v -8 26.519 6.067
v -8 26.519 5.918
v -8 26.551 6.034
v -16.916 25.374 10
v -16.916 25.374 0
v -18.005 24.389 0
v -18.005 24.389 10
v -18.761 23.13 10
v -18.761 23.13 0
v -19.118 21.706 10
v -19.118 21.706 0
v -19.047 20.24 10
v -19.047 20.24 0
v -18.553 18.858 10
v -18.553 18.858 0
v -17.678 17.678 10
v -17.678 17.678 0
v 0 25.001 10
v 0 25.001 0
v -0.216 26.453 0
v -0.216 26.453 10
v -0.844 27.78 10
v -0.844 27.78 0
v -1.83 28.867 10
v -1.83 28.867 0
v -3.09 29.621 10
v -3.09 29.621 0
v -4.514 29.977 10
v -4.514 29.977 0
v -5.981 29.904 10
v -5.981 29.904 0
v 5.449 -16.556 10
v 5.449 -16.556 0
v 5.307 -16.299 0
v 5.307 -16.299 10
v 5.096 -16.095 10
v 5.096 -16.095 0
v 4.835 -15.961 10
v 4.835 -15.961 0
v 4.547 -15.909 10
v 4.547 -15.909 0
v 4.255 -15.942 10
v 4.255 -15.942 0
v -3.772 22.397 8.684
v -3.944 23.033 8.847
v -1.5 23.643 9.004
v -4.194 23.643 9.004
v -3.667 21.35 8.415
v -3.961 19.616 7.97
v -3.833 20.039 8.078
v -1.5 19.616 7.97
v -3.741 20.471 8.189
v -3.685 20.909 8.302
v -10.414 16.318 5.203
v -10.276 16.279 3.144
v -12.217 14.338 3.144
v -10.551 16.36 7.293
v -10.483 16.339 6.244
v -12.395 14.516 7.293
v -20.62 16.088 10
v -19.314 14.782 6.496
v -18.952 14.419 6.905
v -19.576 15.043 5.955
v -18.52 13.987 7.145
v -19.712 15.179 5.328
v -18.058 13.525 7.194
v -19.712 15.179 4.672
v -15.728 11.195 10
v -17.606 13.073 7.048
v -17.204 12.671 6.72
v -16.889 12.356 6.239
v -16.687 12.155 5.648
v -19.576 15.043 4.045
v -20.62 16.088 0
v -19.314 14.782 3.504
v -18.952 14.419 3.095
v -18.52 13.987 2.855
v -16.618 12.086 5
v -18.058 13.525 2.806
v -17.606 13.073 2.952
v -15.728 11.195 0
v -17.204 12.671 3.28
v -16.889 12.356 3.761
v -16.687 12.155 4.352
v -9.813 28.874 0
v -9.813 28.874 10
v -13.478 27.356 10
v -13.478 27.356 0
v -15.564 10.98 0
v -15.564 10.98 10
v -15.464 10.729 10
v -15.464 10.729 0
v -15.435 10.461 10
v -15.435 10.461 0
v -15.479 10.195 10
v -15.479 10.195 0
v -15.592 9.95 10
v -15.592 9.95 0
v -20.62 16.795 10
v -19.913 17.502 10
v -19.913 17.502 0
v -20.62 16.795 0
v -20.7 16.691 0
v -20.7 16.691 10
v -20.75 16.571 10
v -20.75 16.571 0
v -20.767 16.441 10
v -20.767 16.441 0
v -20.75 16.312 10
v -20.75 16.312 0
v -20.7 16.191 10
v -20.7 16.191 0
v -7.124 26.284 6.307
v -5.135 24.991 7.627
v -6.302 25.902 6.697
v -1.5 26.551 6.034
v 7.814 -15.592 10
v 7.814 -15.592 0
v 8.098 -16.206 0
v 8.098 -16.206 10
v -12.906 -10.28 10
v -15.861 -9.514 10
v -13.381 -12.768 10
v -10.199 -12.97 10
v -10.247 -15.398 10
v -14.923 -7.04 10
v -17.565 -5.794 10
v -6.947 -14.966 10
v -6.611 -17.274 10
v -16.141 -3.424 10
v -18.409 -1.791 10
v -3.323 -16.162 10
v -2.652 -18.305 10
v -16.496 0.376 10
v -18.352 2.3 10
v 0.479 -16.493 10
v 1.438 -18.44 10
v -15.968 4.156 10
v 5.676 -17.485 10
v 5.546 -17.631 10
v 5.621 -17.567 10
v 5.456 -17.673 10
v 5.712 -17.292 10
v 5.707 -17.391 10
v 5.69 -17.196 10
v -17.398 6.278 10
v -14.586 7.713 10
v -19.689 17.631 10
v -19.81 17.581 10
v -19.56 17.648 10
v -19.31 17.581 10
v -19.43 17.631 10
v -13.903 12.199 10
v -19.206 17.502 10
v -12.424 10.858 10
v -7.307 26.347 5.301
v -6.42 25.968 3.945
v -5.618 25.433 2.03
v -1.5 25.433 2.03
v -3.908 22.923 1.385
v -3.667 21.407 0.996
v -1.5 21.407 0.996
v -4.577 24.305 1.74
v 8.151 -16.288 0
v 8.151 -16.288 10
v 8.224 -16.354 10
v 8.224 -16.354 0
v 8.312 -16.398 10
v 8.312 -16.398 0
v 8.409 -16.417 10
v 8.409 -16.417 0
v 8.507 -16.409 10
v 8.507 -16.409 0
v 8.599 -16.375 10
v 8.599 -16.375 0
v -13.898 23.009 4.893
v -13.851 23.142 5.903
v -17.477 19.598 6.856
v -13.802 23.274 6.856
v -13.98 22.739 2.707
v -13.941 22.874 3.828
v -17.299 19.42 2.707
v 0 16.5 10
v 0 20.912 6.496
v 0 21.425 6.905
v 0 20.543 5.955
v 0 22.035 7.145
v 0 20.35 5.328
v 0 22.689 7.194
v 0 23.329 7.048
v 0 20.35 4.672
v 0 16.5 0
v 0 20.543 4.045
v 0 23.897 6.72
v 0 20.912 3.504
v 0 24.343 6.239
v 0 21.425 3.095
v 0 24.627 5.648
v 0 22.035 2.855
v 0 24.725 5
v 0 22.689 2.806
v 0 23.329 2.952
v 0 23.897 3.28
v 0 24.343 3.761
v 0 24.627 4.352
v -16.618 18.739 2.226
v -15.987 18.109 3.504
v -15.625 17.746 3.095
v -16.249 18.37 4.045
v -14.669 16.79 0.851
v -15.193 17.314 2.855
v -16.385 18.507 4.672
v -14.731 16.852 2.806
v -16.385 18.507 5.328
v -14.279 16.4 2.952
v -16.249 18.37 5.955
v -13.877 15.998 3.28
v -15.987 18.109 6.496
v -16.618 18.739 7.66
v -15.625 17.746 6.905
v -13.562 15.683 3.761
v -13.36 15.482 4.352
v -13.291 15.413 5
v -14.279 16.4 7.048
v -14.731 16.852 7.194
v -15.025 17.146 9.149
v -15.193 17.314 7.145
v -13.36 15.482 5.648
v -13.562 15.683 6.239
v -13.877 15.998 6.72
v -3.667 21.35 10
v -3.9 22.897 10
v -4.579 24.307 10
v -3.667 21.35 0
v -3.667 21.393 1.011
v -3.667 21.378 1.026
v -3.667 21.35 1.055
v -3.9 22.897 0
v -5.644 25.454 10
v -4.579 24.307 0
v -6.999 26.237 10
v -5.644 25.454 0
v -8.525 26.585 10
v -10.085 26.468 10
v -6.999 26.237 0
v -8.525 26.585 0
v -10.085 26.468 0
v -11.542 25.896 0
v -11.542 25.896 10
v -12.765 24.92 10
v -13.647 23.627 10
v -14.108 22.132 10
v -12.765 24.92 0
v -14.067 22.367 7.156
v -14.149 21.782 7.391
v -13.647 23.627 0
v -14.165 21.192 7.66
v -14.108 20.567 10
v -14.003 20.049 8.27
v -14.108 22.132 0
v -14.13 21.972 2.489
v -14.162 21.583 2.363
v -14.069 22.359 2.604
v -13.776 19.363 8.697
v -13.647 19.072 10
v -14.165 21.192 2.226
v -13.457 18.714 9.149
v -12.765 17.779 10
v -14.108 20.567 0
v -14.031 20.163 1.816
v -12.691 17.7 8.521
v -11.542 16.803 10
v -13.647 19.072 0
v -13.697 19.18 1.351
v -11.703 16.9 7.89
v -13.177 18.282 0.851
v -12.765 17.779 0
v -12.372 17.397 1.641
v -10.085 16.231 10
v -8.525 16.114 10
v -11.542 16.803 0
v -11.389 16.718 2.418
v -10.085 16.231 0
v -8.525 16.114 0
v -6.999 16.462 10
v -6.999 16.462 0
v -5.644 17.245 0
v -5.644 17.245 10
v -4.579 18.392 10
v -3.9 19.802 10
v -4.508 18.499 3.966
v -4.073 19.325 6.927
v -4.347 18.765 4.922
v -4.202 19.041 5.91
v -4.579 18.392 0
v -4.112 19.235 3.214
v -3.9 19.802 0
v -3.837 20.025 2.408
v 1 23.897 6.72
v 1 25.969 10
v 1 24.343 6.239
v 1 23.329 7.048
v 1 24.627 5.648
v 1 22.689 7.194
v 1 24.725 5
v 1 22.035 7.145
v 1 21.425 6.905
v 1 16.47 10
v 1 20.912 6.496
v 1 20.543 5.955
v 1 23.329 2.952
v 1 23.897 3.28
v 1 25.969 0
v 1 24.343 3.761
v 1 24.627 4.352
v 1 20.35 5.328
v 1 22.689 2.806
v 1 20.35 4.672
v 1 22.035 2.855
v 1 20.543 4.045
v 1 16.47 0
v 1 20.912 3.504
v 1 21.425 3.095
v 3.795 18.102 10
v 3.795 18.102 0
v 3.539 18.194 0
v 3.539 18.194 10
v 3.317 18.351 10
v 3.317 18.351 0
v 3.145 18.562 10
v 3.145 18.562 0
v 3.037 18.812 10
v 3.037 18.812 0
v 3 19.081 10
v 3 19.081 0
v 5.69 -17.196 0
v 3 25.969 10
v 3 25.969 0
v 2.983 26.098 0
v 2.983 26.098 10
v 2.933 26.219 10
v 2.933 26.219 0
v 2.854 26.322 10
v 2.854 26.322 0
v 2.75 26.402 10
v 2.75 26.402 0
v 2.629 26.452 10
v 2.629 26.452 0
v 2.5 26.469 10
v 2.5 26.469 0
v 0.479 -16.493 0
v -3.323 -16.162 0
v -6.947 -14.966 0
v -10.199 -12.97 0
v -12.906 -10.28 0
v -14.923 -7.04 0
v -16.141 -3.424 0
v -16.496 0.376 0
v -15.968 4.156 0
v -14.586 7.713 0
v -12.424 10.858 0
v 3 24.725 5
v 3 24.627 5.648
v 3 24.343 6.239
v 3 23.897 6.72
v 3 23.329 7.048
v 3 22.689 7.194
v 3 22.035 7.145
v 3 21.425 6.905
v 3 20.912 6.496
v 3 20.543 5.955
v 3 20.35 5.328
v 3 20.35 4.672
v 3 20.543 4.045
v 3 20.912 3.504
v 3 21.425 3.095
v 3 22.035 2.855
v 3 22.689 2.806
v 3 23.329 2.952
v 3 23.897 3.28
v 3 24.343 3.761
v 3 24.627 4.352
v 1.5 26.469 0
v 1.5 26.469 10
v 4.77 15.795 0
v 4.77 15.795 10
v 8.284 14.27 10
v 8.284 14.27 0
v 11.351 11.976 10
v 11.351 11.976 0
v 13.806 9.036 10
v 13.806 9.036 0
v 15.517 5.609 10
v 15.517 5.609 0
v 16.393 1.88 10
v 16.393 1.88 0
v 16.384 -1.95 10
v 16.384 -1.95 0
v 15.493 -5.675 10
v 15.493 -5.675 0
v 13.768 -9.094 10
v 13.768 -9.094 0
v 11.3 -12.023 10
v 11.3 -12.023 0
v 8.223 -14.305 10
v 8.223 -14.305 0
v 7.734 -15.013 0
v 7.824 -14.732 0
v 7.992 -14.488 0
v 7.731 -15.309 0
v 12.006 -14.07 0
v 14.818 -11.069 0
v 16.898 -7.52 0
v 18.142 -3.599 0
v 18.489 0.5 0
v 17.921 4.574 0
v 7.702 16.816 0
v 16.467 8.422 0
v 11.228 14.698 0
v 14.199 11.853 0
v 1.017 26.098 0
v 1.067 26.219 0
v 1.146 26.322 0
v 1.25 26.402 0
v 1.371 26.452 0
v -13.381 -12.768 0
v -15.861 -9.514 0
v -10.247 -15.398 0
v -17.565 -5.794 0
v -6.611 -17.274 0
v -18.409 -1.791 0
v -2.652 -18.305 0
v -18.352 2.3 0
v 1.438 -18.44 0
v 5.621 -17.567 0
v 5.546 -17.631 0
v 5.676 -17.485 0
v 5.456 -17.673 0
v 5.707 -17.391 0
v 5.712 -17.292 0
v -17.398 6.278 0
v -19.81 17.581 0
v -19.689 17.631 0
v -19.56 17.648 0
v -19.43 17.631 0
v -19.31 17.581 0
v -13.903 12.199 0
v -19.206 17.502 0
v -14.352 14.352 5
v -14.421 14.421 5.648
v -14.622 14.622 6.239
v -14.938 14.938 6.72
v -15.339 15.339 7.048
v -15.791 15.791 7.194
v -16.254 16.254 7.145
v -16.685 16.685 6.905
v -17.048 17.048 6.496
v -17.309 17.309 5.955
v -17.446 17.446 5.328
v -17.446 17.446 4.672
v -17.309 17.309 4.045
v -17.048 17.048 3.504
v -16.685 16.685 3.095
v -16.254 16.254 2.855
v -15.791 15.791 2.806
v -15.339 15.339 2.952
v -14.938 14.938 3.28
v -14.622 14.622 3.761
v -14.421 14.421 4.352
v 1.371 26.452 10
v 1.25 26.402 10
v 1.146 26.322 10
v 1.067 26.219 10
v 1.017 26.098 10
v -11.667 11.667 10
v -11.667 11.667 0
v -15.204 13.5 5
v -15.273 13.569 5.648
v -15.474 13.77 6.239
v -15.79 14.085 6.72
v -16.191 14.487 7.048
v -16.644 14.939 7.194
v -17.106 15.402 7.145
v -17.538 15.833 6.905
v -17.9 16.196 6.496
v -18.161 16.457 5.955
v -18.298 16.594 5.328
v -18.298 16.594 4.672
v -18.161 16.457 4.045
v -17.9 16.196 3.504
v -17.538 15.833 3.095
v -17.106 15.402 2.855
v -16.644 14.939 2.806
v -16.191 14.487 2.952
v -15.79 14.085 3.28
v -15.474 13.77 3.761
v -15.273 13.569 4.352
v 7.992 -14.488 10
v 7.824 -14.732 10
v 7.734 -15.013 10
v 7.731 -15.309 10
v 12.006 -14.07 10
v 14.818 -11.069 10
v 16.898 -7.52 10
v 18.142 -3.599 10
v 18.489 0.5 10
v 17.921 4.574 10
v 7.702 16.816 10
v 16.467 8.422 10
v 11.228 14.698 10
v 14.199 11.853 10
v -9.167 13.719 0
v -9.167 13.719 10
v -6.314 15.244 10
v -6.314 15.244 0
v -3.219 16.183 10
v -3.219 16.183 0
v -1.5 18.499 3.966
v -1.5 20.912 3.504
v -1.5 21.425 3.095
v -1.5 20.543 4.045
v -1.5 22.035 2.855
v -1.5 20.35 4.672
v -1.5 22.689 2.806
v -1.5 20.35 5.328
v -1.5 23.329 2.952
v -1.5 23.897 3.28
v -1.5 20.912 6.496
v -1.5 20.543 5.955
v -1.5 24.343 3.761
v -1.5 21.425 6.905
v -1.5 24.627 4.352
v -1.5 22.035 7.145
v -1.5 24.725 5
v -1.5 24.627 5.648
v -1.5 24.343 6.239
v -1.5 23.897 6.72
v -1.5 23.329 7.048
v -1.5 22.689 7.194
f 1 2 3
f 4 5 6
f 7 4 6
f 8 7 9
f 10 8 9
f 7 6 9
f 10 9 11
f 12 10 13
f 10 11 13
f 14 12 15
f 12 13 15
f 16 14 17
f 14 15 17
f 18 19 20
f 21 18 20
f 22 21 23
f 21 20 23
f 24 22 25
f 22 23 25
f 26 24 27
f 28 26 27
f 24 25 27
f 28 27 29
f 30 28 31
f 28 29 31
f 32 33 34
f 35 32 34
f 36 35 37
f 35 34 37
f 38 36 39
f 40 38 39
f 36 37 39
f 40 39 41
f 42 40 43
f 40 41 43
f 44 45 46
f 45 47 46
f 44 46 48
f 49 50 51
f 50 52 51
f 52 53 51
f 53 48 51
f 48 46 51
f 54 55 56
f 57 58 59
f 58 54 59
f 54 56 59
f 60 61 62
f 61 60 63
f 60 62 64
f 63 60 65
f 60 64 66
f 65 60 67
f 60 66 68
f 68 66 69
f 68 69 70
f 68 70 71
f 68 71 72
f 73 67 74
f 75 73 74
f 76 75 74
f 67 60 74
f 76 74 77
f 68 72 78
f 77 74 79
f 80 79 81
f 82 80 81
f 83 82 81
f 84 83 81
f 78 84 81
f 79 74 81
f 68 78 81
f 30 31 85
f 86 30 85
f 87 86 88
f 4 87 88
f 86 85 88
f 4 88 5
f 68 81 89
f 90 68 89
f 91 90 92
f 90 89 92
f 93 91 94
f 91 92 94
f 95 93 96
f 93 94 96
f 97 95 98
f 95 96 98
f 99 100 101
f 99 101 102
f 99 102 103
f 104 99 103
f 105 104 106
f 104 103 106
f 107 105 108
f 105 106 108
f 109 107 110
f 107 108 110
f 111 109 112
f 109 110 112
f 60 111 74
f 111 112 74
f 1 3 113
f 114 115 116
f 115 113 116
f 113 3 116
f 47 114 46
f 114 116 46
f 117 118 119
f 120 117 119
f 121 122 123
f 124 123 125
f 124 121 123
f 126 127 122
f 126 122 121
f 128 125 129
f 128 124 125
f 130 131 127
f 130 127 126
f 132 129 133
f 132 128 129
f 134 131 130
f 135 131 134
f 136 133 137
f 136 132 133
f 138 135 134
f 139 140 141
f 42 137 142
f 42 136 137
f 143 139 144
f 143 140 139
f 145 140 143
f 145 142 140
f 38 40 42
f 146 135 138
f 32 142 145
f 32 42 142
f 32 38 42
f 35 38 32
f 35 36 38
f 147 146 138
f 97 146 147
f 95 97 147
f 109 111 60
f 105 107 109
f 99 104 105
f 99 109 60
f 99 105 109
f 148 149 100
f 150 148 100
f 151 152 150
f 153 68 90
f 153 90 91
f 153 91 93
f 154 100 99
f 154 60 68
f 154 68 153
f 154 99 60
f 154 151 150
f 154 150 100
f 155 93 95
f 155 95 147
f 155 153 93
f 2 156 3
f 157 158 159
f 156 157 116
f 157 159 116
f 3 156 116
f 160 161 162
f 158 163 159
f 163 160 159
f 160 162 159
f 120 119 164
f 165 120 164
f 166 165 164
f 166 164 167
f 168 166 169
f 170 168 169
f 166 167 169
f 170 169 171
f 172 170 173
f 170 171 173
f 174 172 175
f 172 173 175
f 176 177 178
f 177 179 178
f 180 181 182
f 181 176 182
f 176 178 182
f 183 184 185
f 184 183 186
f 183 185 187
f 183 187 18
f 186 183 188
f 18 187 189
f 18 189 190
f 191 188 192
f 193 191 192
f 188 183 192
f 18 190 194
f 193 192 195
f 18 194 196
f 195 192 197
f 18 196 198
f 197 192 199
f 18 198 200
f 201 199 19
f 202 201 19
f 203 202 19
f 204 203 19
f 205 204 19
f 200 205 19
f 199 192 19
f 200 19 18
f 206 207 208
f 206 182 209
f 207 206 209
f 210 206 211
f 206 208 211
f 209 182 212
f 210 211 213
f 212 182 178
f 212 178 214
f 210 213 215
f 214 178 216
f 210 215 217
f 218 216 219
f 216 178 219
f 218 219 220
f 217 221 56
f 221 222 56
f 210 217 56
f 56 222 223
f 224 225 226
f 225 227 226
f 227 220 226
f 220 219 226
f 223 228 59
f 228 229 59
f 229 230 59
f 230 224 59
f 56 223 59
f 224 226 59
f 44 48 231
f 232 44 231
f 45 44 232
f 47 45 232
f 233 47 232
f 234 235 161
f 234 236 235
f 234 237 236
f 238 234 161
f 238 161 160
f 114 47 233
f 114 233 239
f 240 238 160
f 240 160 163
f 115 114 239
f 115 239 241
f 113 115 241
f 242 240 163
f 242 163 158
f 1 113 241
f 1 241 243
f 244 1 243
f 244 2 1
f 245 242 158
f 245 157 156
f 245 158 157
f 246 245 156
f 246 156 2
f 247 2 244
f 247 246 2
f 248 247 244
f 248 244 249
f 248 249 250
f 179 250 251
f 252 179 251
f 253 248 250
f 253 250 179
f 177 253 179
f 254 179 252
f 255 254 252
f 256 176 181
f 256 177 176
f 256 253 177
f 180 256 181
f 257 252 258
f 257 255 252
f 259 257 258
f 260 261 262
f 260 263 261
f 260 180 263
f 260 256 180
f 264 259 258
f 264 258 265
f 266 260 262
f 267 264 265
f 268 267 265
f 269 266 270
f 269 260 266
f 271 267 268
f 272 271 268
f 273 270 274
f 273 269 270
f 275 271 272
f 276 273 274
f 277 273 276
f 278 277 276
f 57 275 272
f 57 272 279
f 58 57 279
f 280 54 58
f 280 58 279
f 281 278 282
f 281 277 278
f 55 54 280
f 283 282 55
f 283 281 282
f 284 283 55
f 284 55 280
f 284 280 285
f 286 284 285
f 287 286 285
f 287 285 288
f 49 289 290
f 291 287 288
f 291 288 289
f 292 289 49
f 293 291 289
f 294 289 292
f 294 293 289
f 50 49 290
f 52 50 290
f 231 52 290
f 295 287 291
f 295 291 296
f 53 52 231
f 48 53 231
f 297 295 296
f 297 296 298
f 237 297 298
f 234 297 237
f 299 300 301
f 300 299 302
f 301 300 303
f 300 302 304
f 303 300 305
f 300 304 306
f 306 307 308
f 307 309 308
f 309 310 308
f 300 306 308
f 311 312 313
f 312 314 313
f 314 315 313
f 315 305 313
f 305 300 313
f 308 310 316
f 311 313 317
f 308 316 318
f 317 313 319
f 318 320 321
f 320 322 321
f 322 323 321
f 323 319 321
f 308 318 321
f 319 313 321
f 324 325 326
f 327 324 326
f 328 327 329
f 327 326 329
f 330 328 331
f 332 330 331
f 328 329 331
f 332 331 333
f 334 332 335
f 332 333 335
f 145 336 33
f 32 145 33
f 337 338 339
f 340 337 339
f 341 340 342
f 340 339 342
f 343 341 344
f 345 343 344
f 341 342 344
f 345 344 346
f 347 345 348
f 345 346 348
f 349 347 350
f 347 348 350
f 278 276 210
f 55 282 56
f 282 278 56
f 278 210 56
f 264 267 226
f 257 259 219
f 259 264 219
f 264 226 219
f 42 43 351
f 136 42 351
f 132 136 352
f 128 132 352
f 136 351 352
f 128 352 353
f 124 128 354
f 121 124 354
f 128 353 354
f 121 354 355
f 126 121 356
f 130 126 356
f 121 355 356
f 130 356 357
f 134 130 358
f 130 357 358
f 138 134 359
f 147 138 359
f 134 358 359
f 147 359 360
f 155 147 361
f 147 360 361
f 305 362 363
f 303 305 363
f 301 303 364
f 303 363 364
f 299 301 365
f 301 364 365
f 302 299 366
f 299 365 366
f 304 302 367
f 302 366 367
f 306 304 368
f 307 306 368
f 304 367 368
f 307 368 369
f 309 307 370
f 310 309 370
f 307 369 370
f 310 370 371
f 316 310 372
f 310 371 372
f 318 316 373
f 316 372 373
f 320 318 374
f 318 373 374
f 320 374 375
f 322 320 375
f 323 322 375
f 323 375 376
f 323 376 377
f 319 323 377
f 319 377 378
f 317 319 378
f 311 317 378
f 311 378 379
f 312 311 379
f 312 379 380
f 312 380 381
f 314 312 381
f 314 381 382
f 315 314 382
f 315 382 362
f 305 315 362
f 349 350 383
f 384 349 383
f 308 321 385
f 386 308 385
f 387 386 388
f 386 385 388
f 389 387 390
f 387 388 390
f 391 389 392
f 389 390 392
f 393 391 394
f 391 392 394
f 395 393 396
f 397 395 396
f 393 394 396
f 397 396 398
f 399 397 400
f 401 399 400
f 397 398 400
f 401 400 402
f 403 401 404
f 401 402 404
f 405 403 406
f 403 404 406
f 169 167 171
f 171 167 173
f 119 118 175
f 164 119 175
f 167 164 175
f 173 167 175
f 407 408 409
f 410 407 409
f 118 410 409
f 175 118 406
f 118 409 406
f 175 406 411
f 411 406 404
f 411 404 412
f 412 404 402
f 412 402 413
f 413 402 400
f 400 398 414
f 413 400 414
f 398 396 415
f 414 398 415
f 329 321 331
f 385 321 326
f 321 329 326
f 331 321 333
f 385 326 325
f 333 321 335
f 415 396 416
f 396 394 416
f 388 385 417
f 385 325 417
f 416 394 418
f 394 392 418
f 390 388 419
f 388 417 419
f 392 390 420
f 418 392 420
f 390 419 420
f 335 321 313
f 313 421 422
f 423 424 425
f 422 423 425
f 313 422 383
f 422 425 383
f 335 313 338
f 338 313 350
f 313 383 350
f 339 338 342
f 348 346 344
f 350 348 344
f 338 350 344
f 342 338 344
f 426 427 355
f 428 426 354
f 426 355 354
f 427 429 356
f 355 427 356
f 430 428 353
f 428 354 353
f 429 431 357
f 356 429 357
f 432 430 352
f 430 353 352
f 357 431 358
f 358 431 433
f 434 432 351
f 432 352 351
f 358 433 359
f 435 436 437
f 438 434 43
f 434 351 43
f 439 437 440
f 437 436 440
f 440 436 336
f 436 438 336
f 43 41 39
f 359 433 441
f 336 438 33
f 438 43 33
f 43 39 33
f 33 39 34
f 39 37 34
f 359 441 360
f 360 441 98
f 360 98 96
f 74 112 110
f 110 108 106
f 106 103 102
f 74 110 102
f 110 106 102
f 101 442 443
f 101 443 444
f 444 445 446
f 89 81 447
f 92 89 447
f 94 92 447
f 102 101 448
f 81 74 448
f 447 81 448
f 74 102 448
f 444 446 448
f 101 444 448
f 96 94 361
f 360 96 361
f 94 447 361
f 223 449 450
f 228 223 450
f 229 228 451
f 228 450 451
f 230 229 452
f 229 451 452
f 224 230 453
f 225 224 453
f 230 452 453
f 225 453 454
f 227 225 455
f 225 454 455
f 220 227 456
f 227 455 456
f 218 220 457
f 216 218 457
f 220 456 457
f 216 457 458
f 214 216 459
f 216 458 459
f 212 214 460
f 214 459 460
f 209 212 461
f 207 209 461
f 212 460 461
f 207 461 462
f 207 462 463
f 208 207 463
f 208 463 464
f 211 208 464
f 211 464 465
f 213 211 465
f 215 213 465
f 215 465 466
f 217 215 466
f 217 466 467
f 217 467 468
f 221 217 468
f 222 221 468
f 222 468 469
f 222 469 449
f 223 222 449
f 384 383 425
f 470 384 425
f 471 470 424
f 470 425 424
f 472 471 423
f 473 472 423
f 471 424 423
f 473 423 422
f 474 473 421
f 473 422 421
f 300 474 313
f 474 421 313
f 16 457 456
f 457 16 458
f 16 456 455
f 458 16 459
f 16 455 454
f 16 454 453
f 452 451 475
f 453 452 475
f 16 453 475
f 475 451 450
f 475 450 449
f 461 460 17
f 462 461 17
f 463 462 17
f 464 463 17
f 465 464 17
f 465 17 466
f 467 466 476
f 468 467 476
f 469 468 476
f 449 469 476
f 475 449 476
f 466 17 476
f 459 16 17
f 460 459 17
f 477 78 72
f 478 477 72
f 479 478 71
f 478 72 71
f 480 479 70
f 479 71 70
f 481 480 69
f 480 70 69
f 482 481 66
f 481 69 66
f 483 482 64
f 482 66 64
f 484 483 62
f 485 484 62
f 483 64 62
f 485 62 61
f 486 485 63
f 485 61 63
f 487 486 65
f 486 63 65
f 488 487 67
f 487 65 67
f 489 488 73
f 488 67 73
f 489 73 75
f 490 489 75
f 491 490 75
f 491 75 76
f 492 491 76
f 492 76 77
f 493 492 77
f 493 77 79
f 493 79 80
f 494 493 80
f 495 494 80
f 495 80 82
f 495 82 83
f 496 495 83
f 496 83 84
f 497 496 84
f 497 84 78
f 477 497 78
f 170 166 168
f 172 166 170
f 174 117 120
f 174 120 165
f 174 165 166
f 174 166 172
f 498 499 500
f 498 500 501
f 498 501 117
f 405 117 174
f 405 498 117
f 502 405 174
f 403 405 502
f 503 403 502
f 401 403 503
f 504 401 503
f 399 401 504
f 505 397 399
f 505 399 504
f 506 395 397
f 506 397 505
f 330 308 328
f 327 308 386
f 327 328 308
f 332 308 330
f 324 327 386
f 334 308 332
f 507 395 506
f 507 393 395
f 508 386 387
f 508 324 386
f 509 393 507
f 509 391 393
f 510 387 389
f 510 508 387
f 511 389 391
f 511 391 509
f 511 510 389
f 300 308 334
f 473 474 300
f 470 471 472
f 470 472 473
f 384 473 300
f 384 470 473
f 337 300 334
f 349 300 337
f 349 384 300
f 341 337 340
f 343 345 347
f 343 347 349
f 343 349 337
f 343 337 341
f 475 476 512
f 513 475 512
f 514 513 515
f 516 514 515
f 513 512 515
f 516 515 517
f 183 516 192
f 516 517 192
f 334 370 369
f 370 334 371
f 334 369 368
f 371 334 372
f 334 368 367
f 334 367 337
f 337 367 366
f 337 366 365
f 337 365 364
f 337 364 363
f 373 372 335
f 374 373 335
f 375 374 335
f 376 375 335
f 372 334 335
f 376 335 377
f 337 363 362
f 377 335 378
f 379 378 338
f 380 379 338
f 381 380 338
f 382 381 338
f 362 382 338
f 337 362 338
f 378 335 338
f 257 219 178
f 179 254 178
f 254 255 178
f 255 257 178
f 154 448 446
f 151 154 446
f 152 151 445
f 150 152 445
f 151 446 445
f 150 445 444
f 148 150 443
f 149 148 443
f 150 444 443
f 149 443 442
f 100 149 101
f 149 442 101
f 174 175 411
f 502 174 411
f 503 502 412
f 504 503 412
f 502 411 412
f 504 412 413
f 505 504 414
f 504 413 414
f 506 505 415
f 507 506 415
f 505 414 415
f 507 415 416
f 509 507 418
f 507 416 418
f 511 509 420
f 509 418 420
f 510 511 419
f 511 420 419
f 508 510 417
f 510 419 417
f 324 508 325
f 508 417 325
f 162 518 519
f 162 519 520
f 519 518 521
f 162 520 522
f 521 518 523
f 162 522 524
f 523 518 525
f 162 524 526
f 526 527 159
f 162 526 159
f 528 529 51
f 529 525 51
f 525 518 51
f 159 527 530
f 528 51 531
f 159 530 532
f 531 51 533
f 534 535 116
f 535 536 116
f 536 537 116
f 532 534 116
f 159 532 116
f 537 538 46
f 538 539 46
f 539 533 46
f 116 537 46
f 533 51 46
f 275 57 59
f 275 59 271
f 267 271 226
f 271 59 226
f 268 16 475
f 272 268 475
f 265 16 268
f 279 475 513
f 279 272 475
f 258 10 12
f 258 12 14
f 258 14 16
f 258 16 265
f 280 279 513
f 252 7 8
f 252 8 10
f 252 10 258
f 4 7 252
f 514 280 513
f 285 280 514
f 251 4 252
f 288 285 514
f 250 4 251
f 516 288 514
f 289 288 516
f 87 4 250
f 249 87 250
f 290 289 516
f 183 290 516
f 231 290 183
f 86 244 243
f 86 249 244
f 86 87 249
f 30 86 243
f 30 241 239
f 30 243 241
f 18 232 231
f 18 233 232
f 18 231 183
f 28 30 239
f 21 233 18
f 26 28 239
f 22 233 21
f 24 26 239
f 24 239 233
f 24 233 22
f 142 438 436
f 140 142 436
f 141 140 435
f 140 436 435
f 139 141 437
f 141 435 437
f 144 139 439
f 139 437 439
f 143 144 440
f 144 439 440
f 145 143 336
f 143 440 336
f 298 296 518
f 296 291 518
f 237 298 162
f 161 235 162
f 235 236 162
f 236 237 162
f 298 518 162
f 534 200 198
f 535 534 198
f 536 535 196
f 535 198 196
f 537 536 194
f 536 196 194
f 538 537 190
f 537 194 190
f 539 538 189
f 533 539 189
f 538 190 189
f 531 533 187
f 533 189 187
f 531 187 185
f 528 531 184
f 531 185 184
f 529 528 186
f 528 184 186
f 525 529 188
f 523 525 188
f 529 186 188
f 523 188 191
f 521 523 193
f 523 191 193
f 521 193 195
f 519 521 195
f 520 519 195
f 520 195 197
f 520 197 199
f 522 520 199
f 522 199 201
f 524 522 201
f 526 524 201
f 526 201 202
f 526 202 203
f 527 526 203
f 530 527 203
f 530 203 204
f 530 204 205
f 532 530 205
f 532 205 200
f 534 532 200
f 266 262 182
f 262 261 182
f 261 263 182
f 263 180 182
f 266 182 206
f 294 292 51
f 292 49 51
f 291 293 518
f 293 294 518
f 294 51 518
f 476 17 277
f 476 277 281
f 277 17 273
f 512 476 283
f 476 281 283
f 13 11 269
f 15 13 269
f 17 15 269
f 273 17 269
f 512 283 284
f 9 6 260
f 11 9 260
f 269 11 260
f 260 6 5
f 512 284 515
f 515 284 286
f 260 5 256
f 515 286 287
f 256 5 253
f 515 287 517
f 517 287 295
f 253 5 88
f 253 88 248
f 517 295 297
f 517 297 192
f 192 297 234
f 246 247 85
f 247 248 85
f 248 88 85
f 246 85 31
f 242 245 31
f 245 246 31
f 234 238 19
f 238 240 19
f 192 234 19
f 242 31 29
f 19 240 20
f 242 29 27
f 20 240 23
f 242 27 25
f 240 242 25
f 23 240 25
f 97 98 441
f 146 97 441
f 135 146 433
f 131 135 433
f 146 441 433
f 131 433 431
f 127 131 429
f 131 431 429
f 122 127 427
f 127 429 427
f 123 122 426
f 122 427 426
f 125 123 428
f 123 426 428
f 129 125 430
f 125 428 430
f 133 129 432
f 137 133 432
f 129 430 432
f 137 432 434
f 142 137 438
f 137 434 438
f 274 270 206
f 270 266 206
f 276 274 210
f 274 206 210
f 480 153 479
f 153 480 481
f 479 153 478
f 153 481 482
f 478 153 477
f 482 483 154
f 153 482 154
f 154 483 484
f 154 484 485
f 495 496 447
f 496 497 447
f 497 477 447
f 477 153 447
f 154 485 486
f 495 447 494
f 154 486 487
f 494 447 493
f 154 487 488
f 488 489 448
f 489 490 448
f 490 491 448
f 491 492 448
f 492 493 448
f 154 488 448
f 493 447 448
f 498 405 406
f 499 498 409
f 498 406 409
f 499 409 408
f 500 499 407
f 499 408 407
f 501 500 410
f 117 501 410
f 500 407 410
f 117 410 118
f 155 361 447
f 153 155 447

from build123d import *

# Parameters (mm, degrees)
F0_R     = 5.25
F1_DEPTH = 10
F2_R     = 2.2
F3_DEPTH = 8
F4_R     = 2.2
F5_DEPTH = 10
F7_START = -1.5
F6_R     = 2.2
F7_DEPTH = 6.5
F9_START = -1.5
F9_DEPTH = 6.5


with BuildPart() as f1:
    # F0 (on Top) → F1 (new body)
    with BuildSketch(Plane.XY):
        with BuildLine():
            ThreePointArc((-5.9805522045, 29.9036640052), (-11.6702518977, 28.1744804079), (-16.9161945814, 25.3739726195))
            ThreePointArc((-16.9161945814, 25.3739726195), (-19.1183375056, 21.7064108966), (-17.6782033476, 17.6782033476))
            Line((-17.6782033476, 17.6782033476), (-11.6672618896, 11.6672618896))
            ThreePointArc((-11.6672618896, 11.6672618896), (-6.314276634, 15.2440122864), (0, 16.5))
            Line((0, 16.5), (0, 18.4958378407))
            Line((0, 18.4958378407), (0, 24.4958378407))
            Line((0, 24.4958378407), (0, 25.0007549326))
            ThreePointArc((0, 25.0007549326), (-1.830044245, 28.8674564354), (-5.9805522045, 29.9036640052))
        make_face()
        with Locations((-8.9168733158, 21.3495848101)):
            Circle(F0_R, mode=Mode.SUBTRACT)
    extrude(amount=F1_DEPTH)


with BuildPart() as f1b:
    # F0 (on Top) → F1, piece 2 (new body)
    with BuildSketch(Plane.XY):
        with BuildLine():
            Line((1, 25.9687849473), (1, 18.4687849473))
            Line((1, 18.4687849473), (1, 16.469669092))
            ThreePointArc((1, 16.469669092), (16.0634695679, 3.770298424), (8.2231766572, -14.3048762048))
            ThreePointArc((8.2231766572, -14.3048762048), (7.7685045207, -14.8690130872), (7.8141598257, -15.5921263334))
            Line((7.8141598257, -15.5921263334), (8.0983557873, -16.2056980308))
            ThreePointArc((8.0983557873, -16.2056980308), (8.3123062852, -16.3978955775), (8.5990245809, -16.3753715588))
            ThreePointArc((8.5990245809, -16.3753715588), (18.3188515552, 2.552585969), (3.7948280021, 18.1023561413))
            ThreePointArc((3.7948280021, 18.1023561413), (3.2237358704, 18.4506742686), (3, 19.0810820739))
            Line((3, 19.0810820739), (3, 25.9687849473))
            ThreePointArc((3, 25.9687849473), (2.8535533906, 26.3223383379), (2.5, 26.4687849473))
            Line((2.5, 26.4687849473), (1.5, 26.4687849473))
            ThreePointArc((1.5, 26.4687849473), (1.1464466094, 26.3223383379), (1, 25.9687849473))
        make_face()
    extrude(amount=F1_DEPTH)


with BuildPart() as f1c:
    # F0 (on Top) → F1, piece 3 (new body)
    with BuildSketch(Plane.XY):
        with BuildLine():
            Line((-12.4241290652, 10.8577551909), (-13.9029173231, 12.1985616914))
            Line((-13.9029173231, 12.1985616914), (-19.206218182, 17.5018625503))
            ThreePointArc((-19.206218182, 17.5018625503), (-19.5597715726, 17.6483091597), (-19.9133249632, 17.5018625503))
            Line((-19.9133249632, 17.5018625503), (-20.6204317443, 16.7947557691))
            ThreePointArc((-20.6204317443, 16.7947557691), (-20.7668783538, 16.4412023785), (-20.6204317443, 16.0876489879))
            Line((-20.6204317443, 16.0876489879), (-15.7275263694, 11.194743613))
            ThreePointArc((-15.7275263694, 11.194743613), (-15.4405353912, 10.5961248254), (-15.5916515212, 9.9496944814))
            ThreePointArc((-15.5916515212, 9.9496944814), (-14.7115589314, -11.2100870309), (5.4563781376, -17.6726895251))
            ThreePointArc((5.4563781376, -17.6726895251), (5.6763731445, -17.4846153752), (5.6901796061, -17.1955149246))
            Line((5.6901796061, -17.1955149246), (5.4491898521, -16.5555640304))
            ThreePointArc((5.4491898521, -16.5555640304), (4.9705921678, -16.0186393737), (4.2554411406, -15.9418094407))
            ThreePointArc((4.2554411406, -15.9418094407), (-14.0084225871, -8.7185963501), (-12.4241290652, 10.8577551909))
        make_face()
    extrude(amount=F1_DEPTH)


with BuildPart() as f3_tool:
    # F2 (on face) → F3 (new body)
    with BuildSketch(Plane.YZ.offset(3)):
        with Locations((22.5249335106, 5)):
            Circle(F2_R)
    extrude(amount=-F3_DEPTH)


with BuildPart() as f1_1:
    add(f1.part)

    # F3: cut by f3_tool
    add(f3_tool.part, mode=Mode.SUBTRACT)


with BuildPart() as f1b_1:
    add(f1b.part)

    # F3: cut by f3_tool
    add(f3_tool.part, mode=Mode.SUBTRACT)


with BuildPart() as f5_tool:
    # F4 (on face) → F5 (new body)
    with BuildSketch(Plane(origin=(-2.2663913782, -2.2663913782, 0), x_dir=(0.7071067812, -0.7071067812, 0), z_dir=(-0.7071067812, -0.7071067812, 0))):
        with Locations((-22.4967262398, 5)):
            Circle(F4_R)
    extrude(amount=-F5_DEPTH)


with BuildPart() as f1_2:
    add(f1_1.part)

    # F5: cut by f5_tool
    add(f5_tool.part, mode=Mode.SUBTRACT)

    # F6 (on face) → F7 (cut)
    with BuildSketch(Plane(origin=(0, 0, 0), x_dir=(0.7071067812, -0.7071067812, 0), z_dir=(-0.7071067812, -0.7071067812, 0)).offset(F7_START)):
        Polygon((-19.0293720816, 7.2929141155), (-22.7487710335, 9.1492738427), (-25.0007549326, 7.6600675388), (-25.0007549326, 2.2262881477), (-22.2446814462, 0.8507261573), (-18.777327288, 3.1436402728), align=None)
        with Locations((-22.4967262398, 5)):
            Circle(F6_R, mode=Mode.SUBTRACT)
        with Locations((-22.4967262398, 5)):
            Circle(F6_R)
        Polygon((-25.0007549326, 2.2262881477), (-25.0007549326, 7.6600675388), (-26.2161251917, 6.8563597272), (-25.9640803981, 2.7070858845), align=None)
    extrude(amount=-F7_DEPTH, mode=Mode.SUBTRACT)

    # F8 (on face) → F9 (cut)
    with BuildSketch(Plane.YZ.offset(F9_START)):
        Polygon((23.6427854055, 9.0037990885), (19.6164677358, 7.9699876829), (18.4986158409, 3.9661885943), (21.4070816158, 0.9962009115), (25.4333992855, 2.0300123171), (26.5512511804, 6.0338114057), align=None)
    extrude(amount=-F9_DEPTH, mode=Mode.SUBTRACT)


with BuildPart() as f1c_1:
    add(f1c.part)

    # F5: cut by f5_tool
    add(f5_tool.part, mode=Mode.SUBTRACT)


solid = Compound([f1b_1.part, f1_2.part, f1c_1.part])
